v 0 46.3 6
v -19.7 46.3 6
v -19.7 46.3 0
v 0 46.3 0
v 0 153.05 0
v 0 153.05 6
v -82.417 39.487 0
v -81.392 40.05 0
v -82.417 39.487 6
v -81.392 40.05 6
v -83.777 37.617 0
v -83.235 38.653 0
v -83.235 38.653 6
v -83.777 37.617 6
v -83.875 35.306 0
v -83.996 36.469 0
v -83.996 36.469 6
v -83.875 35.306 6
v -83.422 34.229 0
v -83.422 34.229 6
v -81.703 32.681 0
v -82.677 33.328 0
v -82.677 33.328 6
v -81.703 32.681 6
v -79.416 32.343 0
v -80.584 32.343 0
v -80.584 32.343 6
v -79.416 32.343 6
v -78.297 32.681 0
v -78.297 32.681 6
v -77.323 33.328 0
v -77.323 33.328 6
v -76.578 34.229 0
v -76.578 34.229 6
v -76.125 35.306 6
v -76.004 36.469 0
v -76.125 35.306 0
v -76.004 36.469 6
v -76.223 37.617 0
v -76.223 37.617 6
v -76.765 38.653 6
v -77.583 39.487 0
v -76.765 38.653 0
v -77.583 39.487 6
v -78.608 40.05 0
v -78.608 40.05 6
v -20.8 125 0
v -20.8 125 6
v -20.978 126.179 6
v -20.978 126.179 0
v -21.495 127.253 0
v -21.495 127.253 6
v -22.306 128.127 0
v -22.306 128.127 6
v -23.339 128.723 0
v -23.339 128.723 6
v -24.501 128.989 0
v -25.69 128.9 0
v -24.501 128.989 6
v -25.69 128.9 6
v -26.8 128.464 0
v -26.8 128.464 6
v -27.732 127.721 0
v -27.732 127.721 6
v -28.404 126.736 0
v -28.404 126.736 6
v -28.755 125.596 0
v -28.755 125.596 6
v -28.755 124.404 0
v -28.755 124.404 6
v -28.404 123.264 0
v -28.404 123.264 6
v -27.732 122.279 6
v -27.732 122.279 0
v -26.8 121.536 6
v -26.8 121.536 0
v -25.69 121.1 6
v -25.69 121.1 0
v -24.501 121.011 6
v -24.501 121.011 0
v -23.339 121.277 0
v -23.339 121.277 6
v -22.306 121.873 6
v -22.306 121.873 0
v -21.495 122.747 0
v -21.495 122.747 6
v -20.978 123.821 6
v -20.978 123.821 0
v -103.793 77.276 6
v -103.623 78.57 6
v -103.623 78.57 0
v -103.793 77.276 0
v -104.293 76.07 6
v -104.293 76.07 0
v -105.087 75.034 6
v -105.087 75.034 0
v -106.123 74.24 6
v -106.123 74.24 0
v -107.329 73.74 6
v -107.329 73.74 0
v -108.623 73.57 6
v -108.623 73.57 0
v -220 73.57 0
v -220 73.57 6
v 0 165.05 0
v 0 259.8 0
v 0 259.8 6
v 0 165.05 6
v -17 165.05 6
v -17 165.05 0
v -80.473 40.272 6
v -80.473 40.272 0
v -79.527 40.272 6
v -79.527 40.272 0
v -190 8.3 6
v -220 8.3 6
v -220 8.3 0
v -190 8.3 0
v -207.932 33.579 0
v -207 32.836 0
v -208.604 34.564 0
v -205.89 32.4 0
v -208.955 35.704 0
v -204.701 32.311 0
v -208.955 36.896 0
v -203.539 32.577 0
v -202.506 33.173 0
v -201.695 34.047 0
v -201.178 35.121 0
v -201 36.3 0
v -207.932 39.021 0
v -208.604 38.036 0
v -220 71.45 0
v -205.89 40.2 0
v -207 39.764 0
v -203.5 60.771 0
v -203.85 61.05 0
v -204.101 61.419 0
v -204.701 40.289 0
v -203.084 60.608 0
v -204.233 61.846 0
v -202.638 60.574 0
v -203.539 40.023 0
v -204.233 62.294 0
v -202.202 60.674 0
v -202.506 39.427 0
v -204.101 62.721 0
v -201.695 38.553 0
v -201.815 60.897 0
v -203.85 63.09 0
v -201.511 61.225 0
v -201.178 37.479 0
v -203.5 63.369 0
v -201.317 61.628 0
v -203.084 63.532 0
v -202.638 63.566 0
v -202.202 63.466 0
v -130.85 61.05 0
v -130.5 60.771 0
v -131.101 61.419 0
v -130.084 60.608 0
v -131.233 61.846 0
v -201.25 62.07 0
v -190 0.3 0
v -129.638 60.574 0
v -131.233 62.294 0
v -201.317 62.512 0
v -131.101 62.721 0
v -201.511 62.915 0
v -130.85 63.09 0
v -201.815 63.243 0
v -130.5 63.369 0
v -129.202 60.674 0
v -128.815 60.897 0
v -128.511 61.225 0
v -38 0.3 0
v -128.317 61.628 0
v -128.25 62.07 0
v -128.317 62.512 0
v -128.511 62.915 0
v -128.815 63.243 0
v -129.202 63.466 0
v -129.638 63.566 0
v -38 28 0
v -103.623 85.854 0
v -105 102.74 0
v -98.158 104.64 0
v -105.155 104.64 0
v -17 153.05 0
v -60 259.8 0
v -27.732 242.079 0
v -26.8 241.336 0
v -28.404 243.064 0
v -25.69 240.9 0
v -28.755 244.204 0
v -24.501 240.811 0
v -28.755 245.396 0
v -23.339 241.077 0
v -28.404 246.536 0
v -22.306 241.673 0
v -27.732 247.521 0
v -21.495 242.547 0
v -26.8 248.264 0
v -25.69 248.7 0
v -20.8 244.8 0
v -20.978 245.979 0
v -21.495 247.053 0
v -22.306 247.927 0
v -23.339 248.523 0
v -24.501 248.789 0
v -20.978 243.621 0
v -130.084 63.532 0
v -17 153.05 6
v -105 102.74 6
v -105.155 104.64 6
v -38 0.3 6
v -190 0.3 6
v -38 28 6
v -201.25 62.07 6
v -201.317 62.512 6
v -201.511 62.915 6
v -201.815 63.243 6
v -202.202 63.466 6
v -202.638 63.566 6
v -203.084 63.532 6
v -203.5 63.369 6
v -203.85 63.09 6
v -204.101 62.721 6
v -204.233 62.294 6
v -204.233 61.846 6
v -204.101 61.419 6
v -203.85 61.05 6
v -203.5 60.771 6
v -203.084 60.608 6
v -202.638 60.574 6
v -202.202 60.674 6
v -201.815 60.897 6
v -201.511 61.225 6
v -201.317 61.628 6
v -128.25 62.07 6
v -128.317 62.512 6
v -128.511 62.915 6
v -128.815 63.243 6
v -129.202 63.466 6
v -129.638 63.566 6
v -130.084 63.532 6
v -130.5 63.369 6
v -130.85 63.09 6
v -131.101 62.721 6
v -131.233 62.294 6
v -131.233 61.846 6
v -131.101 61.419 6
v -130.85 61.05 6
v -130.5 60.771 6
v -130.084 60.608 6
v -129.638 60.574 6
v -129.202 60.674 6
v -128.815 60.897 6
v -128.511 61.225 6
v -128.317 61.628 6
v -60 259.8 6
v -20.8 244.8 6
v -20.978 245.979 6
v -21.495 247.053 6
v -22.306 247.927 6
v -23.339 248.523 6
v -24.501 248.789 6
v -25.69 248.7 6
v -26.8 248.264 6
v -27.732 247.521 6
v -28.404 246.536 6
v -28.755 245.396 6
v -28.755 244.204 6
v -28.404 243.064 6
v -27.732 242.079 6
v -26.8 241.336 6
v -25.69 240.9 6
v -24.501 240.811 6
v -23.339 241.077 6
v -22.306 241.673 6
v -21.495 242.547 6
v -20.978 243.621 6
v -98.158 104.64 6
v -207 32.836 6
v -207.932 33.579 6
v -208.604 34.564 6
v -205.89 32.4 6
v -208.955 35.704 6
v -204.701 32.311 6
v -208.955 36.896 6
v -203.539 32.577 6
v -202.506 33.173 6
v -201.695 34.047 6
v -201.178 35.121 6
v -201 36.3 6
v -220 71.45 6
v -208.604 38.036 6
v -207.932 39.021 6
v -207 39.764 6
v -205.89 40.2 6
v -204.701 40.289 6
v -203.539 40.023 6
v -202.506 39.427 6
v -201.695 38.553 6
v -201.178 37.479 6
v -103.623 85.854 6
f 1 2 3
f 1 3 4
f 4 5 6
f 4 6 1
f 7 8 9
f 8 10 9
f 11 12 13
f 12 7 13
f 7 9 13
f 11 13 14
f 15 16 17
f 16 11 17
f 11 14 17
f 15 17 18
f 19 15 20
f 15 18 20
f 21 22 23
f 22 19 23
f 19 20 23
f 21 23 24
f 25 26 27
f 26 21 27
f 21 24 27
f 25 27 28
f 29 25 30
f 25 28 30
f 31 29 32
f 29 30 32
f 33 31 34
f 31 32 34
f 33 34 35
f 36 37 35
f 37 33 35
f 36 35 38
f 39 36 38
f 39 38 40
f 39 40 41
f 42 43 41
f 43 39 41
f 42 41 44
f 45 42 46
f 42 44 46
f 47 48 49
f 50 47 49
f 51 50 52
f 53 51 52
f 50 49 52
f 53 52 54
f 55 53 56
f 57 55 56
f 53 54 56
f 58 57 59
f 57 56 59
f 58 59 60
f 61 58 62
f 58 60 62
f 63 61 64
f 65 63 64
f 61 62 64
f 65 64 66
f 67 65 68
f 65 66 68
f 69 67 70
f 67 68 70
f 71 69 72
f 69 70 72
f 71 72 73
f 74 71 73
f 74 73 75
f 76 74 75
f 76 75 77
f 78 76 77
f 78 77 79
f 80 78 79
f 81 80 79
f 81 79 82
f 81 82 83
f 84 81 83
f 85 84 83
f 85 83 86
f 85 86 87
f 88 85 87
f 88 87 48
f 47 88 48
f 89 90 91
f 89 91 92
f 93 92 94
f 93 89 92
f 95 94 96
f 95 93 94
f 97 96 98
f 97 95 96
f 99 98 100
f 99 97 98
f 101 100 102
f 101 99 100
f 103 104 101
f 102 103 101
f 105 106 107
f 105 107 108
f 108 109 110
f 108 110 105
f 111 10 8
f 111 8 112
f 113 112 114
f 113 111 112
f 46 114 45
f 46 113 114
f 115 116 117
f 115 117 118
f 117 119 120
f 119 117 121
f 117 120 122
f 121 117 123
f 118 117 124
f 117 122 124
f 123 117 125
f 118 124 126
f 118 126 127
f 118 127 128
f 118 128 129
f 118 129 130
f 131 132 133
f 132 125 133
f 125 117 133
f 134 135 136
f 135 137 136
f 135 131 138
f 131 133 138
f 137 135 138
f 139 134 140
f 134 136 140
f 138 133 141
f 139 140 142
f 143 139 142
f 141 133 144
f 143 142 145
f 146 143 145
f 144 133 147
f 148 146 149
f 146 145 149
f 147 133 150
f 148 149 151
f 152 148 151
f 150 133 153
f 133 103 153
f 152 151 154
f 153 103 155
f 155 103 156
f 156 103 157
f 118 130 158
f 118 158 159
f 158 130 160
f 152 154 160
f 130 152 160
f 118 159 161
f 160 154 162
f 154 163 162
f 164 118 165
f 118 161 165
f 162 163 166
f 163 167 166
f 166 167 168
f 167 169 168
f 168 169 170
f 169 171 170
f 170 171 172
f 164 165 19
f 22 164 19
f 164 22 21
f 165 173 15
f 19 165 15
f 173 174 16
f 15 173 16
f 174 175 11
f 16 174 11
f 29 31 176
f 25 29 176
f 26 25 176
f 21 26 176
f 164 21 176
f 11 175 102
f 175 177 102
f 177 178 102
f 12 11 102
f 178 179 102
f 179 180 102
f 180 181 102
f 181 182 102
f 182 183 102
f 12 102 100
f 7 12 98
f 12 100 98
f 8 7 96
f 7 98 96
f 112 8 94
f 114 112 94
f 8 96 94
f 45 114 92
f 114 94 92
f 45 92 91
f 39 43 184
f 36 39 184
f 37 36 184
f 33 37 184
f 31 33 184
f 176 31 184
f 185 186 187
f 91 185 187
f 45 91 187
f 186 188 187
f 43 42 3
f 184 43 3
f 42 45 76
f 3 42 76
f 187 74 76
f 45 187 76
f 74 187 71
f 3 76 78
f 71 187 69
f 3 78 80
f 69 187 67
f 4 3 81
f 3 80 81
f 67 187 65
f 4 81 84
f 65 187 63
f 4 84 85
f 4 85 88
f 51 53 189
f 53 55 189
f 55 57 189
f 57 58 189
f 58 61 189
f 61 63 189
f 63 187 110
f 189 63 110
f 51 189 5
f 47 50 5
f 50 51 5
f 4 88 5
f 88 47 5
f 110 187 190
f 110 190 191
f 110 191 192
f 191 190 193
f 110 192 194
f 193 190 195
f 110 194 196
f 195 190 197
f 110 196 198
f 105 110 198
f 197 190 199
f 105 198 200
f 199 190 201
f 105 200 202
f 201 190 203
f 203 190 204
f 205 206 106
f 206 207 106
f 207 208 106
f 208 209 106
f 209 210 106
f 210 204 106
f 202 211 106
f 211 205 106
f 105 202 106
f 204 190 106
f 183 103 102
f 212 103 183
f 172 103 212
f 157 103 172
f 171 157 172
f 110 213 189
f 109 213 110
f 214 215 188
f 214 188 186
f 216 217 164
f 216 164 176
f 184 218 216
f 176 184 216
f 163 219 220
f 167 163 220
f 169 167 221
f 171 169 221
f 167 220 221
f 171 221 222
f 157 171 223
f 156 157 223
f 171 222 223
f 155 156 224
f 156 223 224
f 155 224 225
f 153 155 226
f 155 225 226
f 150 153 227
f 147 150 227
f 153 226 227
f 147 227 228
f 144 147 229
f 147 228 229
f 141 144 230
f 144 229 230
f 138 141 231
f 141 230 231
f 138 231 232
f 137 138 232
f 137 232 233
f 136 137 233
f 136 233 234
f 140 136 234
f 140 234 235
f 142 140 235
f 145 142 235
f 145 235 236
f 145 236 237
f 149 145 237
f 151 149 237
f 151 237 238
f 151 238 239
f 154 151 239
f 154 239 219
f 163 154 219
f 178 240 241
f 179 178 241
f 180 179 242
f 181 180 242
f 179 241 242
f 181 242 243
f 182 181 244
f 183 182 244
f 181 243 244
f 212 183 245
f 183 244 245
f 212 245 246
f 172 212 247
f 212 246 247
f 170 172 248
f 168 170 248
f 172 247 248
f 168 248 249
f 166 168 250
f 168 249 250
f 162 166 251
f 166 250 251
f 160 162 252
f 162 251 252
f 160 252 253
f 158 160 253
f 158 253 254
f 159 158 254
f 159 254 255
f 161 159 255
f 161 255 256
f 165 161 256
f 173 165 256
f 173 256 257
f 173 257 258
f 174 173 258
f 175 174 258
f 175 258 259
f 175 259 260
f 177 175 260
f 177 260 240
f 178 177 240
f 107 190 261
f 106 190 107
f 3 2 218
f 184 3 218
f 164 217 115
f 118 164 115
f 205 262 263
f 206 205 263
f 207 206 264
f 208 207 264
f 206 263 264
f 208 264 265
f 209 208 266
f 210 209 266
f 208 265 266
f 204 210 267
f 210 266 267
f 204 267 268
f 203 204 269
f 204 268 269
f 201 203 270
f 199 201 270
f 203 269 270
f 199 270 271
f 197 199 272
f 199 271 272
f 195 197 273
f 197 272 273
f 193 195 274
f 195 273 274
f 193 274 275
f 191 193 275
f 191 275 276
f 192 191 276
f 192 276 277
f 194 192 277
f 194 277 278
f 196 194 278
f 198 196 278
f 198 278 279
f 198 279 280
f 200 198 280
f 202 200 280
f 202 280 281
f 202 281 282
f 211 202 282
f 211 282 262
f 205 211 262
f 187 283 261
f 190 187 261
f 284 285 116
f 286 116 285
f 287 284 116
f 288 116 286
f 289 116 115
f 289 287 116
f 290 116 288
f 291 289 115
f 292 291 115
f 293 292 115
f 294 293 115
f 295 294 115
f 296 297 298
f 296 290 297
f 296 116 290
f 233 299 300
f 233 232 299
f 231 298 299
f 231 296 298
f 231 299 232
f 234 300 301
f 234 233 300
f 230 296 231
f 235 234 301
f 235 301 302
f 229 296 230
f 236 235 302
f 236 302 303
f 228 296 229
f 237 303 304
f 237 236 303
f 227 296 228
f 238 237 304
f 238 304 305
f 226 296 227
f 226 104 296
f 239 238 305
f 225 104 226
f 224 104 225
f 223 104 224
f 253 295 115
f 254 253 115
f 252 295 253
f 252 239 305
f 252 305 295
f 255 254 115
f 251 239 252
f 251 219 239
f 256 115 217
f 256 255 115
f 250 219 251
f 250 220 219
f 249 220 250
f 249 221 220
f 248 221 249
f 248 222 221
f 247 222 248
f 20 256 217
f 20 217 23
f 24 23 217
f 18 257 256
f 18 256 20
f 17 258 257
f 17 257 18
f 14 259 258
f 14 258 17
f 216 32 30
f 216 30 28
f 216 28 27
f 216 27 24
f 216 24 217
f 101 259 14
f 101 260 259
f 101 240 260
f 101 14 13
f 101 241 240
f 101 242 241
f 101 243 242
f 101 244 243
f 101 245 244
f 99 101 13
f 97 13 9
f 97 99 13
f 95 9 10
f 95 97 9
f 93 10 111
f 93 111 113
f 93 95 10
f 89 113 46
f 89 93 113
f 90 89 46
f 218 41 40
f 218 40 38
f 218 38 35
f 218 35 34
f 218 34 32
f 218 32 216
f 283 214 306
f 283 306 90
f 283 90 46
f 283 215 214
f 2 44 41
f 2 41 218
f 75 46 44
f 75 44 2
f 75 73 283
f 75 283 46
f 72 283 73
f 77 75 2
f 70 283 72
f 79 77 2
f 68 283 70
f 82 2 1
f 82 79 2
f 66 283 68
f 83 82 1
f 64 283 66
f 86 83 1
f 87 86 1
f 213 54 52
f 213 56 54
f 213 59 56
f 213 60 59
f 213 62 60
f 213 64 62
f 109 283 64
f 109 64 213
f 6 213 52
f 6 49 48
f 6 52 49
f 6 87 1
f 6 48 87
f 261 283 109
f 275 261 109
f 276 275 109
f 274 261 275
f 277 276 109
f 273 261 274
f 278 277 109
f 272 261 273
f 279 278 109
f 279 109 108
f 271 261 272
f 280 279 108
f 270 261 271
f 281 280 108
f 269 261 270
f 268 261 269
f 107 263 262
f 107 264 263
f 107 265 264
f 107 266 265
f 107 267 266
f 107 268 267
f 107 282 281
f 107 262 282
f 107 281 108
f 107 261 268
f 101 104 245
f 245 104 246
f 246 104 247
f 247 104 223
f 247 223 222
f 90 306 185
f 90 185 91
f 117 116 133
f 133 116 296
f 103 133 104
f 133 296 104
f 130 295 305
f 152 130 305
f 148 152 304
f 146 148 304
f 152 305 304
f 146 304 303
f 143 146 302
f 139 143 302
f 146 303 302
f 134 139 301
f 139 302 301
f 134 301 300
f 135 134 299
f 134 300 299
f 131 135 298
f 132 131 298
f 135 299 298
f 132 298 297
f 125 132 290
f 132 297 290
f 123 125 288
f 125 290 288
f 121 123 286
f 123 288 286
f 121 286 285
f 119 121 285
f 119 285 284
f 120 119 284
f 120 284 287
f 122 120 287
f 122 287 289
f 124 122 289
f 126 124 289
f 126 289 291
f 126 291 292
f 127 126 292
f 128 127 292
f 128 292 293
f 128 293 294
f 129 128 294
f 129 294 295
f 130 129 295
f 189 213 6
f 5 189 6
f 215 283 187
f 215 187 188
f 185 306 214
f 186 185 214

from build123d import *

# Parameters (mm, degrees)
BOSS_EXTRUDE2_DEPTH     = 6
SKETCH2_R               = 4
SKETCH2_W               = 30
SKETCH2_H               = 8.3
CUT_EXTRUDE1_DEPTH      = 341.487943986
CROQUIS1_W              = 103.610606389
CROQUIS1_H              = 1.56
SALIENTE_EXTRUIR2_DEPTH = 6
SALIENTE_EXTRUIR3_DEPTH = 6
SALIENTE_EXTRUIR4_START = -6
SALIENTE_EXTRUIR4_DEPTH = 6
SALIENTE_EXTRUIR5_DEPTH = 6
SALIENTE_EXTRUIR6_DEPTH = 6
CROQUIS7_W              = 103.610606389
CROQUIS7_H              = 0.56
SALIENTE_EXTRUIR7_DEPTH = 6
SALIENTE_EXTRUIR8_DEPTH = 6
SKETCH3_R               = 1.5
CUT_EXTRUDE2_DEPTH      = 341.487943986
CUT_EXTRUDE3_DEPTH      = 341.487943986
CROQUIS9_W              = 152
CROQUIS9_H              = 0.3
CORTAR_EXTRUIR1_DEPTH   = 10
CORTAR_EXTRUIR2_DEPTH   = 6
CROQUIS12_R             = 4
CORTAR_EXTRUIR3_DEPTH   = 6
SALIENTE_EXTRUIR9_DEPTH = 6
CROQUIS14_W             = 17
CROQUIS14_H             = 12
CORTAR_EXTRUIR4_DEPTH   = 10


with BuildPart() as part:
    # Sketch1 → Boss-Extrude2 (new body)
    with BuildSketch(Plane.XY):
        with BuildLine():
            Line((0, 0), (-220, 0))
            Line((-220, 0), (-220, 71.45))
            Line((-220, 71.45), (-116.389393611, 71.45))
            ThreePointArc((-116.389393611, 71.45), (-107.149394721, 74.662079518), (-101.894274329, 82.913063942))
            Line((-101.894274329, 82.913063942), (-60, 259.8))
            Line((-60, 259.8), (0, 259.8))
            Line((0, 259.8), (0, 0))
        make_face()
    extrude(amount=BOSS_EXTRUDE2_DEPTH)

    # Sketch2 → Cut-Extrude1 (cut, through all)
    with BuildSketch(Plane.XY.offset(6)):
        with Locations((-205, 36.3)):
            Circle(SKETCH2_R)
        with Locations((-24.8, 244.8)):
            Circle(SKETCH2_R)
        with Locations((-24.8, 125)):
            Circle(SKETCH2_R)
        with Locations((-80, 43.8)):
            Circle(SKETCH2_R)
        with Locations((-205, 4.15)):
            Rectangle(SKETCH2_W, SKETCH2_H)
        Polygon((-38, 0), (-38, 19), (-10.7, 46.3), (0, 46.3), (0, 0), align=None)
    extrude(amount=-CUT_EXTRUDE1_DEPTH, mode=Mode.SUBTRACT)

    # Croquis1 → Saliente-Extruir2 (add)
    with BuildSketch(Plane.XY.offset(6)):
        with Locations((-168.194696806, 72.23)):
            Rectangle(CROQUIS1_W, CROQUIS1_H)
    extrude(amount=-SALIENTE_EXTRUIR2_DEPTH)

    # Croquis3 → Saliente-Extruir3 (add)
    with BuildSketch(Plane.XY.offset(6)):
        Polygon((-101.894274329, 82.913063942), (-103.412279578, 83.272591501), (-60, 259.8), align=None)
    extrude(amount=-SALIENTE_EXTRUIR3_DEPTH)

    # Croquis4 → Saliente-Extruir4 (add)
    with BuildSketch(Plane.XY.offset(6).offset(SALIENTE_EXTRUIR4_START)):
        with BuildLine():
            Line((-103.412279578, 83.272591501), (-101.894274329, 82.913063942))
            ThreePointArc((-101.894274329, 82.913063942), (-107.149394721, 74.662079518), (-116.389393611, 71.45))
            Line((-116.389393611, 71.45), (-116.389393611, 73.01))
            ThreePointArc((-116.389393611, 73.01), (-108.117056079, 75.88569363), (-103.412279578, 83.272591501))
        make_face()
    extrude(amount=SALIENTE_EXTRUIR4_DEPTH)

    # Croquis5 → Saliente-Extruir5 (add)
    with BuildSketch(Plane.XY.offset(6)):
        Polygon((-105, 102.74), (-55, 102.74), (-103.412279578, 83.272591501), align=None)
    extrude(amount=-SALIENTE_EXTRUIR5_DEPTH)

    # Croquis6 → Saliente-Extruir6 (add)
    with BuildSketch(Plane.XY.offset(6)):
        Polygon((-98.157526679, 104.64), (-105.154959958, 104.64), (-105, 102.74), (-98.624781775, 102.74), align=None)
    extrude(amount=-SALIENTE_EXTRUIR6_DEPTH)

    # Croquis7 → Saliente-Extruir7 (add)
    with BuildSketch(Plane.XY.offset(6)):
        with Locations((-168.194696806, 73.29)):
            Rectangle(CROQUIS7_W, CROQUIS7_H)
    extrude(amount=-SALIENTE_EXTRUIR7_DEPTH)

    # Croquis8 → Saliente-Extruir8 (add)
    with BuildSketch(Plane.XY.offset(6)):
        with BuildLine():
            Line((-116.389393611, 73.57), (-117.98880457, 71.652693326))
            Line((-117.98880457, 71.652693326), (-105.380568296, 73.057716723))
            Line((-105.380568296, 73.057716723), (-100.684832206, 83.373546401))
            Line((-100.684832206, 83.373546401), (-103.622774874, 85.853523162))
            ThreePointArc((-103.622774874, 85.853523162), (-107.531184208, 77.13952683), (-116.389393611, 73.57))
        make_face()
    extrude(amount=-SALIENTE_EXTRUIR8_DEPTH)

    # Sketch3 → Cut-Extrude2 (cut, through all)
    with BuildSketch(Plane.XY.offset(6)):
        with Locations((-202.75, 62.07)):
            Circle(SKETCH3_R)
        with Locations((-129.75, 62.07)):
            Circle(SKETCH3_R)
    extrude(amount=-CUT_EXTRUDE2_DEPTH, mode=Mode.SUBTRACT)

    # Sketch4 → Cut-Extrude3 (cut, through all)
    with BuildSketch(Plane.XY.offset(6)):
        with BuildLine():
            Line((-103.622774874, 85.853523162), (-103.622774874, 78.57))
            ThreePointArc((-103.622774874, 78.57), (-105.087240968, 75.034466094), (-108.622774874, 73.57))
            Line((-108.622774874, 73.57), (-116.389393611, 73.57))
            ThreePointArc((-116.389393611, 73.57), (-107.531184208, 77.13952683), (-103.622774874, 85.853523162))
        make_face()
    extrude(amount=-CUT_EXTRUDE3_DEPTH, mode=Mode.SUBTRACT)

    # Croquis9 → Cortar-Extruir1 (cut)
    with BuildSketch(Plane.XY.offset(6)):
        with Locations((-114, 0.15)):
            Rectangle(CROQUIS9_W, CROQUIS9_H)
    extrude(amount=-CORTAR_EXTRUIR1_DEPTH, mode=Mode.SUBTRACT)

    # Croquis11 → Cortar-Extruir2 (cut)
    with BuildSketch(Plane.XY.offset(6)):
        Polygon((-10.7, 46.3), (-19.7, 46.3), (-38, 28), (-38, 19), align=None)
    extrude(amount=-CORTAR_EXTRUIR2_DEPTH, mode=Mode.SUBTRACT)

    # Croquis12 → Cortar-Extruir3 (cut)
    with BuildSketch(Plane.XY.offset(6)):
        with Locations((-80, 36.3)):
            Circle(CROQUIS12_R)
    extrude(amount=-CORTAR_EXTRUIR3_DEPTH, mode=Mode.SUBTRACT)

    # Croquis13 → Saliente-Extruir9 (add)
    with BuildSketch(Plane.XY.offset(6)):
        with BuildLine():
            ThreePointArc((-78.608058909, 40.05), (-76.716117819, 41.516117819), (-76, 43.8))
            ThreePointArc((-76, 43.8), (-82.283882181, 47.083882181), (-81.391941091, 40.05))
            ThreePointArc((-81.391941091, 40.05), (-80, 40.3), (-78.608058909, 40.05))
        make_face()
    extrude(amount=-SALIENTE_EXTRUIR9_DEPTH)

    # Croquis14 → Cortar-Extruir4 (cut)
    with BuildSketch(Plane.XY.offset(6)):
        with Locations((-8.5, 159.05)):
            Rectangle(CROQUIS14_W, CROQUIS14_H)
    extrude(amount=-CORTAR_EXTRUIR4_DEPTH, mode=Mode.SUBTRACT)


solid = part.part
